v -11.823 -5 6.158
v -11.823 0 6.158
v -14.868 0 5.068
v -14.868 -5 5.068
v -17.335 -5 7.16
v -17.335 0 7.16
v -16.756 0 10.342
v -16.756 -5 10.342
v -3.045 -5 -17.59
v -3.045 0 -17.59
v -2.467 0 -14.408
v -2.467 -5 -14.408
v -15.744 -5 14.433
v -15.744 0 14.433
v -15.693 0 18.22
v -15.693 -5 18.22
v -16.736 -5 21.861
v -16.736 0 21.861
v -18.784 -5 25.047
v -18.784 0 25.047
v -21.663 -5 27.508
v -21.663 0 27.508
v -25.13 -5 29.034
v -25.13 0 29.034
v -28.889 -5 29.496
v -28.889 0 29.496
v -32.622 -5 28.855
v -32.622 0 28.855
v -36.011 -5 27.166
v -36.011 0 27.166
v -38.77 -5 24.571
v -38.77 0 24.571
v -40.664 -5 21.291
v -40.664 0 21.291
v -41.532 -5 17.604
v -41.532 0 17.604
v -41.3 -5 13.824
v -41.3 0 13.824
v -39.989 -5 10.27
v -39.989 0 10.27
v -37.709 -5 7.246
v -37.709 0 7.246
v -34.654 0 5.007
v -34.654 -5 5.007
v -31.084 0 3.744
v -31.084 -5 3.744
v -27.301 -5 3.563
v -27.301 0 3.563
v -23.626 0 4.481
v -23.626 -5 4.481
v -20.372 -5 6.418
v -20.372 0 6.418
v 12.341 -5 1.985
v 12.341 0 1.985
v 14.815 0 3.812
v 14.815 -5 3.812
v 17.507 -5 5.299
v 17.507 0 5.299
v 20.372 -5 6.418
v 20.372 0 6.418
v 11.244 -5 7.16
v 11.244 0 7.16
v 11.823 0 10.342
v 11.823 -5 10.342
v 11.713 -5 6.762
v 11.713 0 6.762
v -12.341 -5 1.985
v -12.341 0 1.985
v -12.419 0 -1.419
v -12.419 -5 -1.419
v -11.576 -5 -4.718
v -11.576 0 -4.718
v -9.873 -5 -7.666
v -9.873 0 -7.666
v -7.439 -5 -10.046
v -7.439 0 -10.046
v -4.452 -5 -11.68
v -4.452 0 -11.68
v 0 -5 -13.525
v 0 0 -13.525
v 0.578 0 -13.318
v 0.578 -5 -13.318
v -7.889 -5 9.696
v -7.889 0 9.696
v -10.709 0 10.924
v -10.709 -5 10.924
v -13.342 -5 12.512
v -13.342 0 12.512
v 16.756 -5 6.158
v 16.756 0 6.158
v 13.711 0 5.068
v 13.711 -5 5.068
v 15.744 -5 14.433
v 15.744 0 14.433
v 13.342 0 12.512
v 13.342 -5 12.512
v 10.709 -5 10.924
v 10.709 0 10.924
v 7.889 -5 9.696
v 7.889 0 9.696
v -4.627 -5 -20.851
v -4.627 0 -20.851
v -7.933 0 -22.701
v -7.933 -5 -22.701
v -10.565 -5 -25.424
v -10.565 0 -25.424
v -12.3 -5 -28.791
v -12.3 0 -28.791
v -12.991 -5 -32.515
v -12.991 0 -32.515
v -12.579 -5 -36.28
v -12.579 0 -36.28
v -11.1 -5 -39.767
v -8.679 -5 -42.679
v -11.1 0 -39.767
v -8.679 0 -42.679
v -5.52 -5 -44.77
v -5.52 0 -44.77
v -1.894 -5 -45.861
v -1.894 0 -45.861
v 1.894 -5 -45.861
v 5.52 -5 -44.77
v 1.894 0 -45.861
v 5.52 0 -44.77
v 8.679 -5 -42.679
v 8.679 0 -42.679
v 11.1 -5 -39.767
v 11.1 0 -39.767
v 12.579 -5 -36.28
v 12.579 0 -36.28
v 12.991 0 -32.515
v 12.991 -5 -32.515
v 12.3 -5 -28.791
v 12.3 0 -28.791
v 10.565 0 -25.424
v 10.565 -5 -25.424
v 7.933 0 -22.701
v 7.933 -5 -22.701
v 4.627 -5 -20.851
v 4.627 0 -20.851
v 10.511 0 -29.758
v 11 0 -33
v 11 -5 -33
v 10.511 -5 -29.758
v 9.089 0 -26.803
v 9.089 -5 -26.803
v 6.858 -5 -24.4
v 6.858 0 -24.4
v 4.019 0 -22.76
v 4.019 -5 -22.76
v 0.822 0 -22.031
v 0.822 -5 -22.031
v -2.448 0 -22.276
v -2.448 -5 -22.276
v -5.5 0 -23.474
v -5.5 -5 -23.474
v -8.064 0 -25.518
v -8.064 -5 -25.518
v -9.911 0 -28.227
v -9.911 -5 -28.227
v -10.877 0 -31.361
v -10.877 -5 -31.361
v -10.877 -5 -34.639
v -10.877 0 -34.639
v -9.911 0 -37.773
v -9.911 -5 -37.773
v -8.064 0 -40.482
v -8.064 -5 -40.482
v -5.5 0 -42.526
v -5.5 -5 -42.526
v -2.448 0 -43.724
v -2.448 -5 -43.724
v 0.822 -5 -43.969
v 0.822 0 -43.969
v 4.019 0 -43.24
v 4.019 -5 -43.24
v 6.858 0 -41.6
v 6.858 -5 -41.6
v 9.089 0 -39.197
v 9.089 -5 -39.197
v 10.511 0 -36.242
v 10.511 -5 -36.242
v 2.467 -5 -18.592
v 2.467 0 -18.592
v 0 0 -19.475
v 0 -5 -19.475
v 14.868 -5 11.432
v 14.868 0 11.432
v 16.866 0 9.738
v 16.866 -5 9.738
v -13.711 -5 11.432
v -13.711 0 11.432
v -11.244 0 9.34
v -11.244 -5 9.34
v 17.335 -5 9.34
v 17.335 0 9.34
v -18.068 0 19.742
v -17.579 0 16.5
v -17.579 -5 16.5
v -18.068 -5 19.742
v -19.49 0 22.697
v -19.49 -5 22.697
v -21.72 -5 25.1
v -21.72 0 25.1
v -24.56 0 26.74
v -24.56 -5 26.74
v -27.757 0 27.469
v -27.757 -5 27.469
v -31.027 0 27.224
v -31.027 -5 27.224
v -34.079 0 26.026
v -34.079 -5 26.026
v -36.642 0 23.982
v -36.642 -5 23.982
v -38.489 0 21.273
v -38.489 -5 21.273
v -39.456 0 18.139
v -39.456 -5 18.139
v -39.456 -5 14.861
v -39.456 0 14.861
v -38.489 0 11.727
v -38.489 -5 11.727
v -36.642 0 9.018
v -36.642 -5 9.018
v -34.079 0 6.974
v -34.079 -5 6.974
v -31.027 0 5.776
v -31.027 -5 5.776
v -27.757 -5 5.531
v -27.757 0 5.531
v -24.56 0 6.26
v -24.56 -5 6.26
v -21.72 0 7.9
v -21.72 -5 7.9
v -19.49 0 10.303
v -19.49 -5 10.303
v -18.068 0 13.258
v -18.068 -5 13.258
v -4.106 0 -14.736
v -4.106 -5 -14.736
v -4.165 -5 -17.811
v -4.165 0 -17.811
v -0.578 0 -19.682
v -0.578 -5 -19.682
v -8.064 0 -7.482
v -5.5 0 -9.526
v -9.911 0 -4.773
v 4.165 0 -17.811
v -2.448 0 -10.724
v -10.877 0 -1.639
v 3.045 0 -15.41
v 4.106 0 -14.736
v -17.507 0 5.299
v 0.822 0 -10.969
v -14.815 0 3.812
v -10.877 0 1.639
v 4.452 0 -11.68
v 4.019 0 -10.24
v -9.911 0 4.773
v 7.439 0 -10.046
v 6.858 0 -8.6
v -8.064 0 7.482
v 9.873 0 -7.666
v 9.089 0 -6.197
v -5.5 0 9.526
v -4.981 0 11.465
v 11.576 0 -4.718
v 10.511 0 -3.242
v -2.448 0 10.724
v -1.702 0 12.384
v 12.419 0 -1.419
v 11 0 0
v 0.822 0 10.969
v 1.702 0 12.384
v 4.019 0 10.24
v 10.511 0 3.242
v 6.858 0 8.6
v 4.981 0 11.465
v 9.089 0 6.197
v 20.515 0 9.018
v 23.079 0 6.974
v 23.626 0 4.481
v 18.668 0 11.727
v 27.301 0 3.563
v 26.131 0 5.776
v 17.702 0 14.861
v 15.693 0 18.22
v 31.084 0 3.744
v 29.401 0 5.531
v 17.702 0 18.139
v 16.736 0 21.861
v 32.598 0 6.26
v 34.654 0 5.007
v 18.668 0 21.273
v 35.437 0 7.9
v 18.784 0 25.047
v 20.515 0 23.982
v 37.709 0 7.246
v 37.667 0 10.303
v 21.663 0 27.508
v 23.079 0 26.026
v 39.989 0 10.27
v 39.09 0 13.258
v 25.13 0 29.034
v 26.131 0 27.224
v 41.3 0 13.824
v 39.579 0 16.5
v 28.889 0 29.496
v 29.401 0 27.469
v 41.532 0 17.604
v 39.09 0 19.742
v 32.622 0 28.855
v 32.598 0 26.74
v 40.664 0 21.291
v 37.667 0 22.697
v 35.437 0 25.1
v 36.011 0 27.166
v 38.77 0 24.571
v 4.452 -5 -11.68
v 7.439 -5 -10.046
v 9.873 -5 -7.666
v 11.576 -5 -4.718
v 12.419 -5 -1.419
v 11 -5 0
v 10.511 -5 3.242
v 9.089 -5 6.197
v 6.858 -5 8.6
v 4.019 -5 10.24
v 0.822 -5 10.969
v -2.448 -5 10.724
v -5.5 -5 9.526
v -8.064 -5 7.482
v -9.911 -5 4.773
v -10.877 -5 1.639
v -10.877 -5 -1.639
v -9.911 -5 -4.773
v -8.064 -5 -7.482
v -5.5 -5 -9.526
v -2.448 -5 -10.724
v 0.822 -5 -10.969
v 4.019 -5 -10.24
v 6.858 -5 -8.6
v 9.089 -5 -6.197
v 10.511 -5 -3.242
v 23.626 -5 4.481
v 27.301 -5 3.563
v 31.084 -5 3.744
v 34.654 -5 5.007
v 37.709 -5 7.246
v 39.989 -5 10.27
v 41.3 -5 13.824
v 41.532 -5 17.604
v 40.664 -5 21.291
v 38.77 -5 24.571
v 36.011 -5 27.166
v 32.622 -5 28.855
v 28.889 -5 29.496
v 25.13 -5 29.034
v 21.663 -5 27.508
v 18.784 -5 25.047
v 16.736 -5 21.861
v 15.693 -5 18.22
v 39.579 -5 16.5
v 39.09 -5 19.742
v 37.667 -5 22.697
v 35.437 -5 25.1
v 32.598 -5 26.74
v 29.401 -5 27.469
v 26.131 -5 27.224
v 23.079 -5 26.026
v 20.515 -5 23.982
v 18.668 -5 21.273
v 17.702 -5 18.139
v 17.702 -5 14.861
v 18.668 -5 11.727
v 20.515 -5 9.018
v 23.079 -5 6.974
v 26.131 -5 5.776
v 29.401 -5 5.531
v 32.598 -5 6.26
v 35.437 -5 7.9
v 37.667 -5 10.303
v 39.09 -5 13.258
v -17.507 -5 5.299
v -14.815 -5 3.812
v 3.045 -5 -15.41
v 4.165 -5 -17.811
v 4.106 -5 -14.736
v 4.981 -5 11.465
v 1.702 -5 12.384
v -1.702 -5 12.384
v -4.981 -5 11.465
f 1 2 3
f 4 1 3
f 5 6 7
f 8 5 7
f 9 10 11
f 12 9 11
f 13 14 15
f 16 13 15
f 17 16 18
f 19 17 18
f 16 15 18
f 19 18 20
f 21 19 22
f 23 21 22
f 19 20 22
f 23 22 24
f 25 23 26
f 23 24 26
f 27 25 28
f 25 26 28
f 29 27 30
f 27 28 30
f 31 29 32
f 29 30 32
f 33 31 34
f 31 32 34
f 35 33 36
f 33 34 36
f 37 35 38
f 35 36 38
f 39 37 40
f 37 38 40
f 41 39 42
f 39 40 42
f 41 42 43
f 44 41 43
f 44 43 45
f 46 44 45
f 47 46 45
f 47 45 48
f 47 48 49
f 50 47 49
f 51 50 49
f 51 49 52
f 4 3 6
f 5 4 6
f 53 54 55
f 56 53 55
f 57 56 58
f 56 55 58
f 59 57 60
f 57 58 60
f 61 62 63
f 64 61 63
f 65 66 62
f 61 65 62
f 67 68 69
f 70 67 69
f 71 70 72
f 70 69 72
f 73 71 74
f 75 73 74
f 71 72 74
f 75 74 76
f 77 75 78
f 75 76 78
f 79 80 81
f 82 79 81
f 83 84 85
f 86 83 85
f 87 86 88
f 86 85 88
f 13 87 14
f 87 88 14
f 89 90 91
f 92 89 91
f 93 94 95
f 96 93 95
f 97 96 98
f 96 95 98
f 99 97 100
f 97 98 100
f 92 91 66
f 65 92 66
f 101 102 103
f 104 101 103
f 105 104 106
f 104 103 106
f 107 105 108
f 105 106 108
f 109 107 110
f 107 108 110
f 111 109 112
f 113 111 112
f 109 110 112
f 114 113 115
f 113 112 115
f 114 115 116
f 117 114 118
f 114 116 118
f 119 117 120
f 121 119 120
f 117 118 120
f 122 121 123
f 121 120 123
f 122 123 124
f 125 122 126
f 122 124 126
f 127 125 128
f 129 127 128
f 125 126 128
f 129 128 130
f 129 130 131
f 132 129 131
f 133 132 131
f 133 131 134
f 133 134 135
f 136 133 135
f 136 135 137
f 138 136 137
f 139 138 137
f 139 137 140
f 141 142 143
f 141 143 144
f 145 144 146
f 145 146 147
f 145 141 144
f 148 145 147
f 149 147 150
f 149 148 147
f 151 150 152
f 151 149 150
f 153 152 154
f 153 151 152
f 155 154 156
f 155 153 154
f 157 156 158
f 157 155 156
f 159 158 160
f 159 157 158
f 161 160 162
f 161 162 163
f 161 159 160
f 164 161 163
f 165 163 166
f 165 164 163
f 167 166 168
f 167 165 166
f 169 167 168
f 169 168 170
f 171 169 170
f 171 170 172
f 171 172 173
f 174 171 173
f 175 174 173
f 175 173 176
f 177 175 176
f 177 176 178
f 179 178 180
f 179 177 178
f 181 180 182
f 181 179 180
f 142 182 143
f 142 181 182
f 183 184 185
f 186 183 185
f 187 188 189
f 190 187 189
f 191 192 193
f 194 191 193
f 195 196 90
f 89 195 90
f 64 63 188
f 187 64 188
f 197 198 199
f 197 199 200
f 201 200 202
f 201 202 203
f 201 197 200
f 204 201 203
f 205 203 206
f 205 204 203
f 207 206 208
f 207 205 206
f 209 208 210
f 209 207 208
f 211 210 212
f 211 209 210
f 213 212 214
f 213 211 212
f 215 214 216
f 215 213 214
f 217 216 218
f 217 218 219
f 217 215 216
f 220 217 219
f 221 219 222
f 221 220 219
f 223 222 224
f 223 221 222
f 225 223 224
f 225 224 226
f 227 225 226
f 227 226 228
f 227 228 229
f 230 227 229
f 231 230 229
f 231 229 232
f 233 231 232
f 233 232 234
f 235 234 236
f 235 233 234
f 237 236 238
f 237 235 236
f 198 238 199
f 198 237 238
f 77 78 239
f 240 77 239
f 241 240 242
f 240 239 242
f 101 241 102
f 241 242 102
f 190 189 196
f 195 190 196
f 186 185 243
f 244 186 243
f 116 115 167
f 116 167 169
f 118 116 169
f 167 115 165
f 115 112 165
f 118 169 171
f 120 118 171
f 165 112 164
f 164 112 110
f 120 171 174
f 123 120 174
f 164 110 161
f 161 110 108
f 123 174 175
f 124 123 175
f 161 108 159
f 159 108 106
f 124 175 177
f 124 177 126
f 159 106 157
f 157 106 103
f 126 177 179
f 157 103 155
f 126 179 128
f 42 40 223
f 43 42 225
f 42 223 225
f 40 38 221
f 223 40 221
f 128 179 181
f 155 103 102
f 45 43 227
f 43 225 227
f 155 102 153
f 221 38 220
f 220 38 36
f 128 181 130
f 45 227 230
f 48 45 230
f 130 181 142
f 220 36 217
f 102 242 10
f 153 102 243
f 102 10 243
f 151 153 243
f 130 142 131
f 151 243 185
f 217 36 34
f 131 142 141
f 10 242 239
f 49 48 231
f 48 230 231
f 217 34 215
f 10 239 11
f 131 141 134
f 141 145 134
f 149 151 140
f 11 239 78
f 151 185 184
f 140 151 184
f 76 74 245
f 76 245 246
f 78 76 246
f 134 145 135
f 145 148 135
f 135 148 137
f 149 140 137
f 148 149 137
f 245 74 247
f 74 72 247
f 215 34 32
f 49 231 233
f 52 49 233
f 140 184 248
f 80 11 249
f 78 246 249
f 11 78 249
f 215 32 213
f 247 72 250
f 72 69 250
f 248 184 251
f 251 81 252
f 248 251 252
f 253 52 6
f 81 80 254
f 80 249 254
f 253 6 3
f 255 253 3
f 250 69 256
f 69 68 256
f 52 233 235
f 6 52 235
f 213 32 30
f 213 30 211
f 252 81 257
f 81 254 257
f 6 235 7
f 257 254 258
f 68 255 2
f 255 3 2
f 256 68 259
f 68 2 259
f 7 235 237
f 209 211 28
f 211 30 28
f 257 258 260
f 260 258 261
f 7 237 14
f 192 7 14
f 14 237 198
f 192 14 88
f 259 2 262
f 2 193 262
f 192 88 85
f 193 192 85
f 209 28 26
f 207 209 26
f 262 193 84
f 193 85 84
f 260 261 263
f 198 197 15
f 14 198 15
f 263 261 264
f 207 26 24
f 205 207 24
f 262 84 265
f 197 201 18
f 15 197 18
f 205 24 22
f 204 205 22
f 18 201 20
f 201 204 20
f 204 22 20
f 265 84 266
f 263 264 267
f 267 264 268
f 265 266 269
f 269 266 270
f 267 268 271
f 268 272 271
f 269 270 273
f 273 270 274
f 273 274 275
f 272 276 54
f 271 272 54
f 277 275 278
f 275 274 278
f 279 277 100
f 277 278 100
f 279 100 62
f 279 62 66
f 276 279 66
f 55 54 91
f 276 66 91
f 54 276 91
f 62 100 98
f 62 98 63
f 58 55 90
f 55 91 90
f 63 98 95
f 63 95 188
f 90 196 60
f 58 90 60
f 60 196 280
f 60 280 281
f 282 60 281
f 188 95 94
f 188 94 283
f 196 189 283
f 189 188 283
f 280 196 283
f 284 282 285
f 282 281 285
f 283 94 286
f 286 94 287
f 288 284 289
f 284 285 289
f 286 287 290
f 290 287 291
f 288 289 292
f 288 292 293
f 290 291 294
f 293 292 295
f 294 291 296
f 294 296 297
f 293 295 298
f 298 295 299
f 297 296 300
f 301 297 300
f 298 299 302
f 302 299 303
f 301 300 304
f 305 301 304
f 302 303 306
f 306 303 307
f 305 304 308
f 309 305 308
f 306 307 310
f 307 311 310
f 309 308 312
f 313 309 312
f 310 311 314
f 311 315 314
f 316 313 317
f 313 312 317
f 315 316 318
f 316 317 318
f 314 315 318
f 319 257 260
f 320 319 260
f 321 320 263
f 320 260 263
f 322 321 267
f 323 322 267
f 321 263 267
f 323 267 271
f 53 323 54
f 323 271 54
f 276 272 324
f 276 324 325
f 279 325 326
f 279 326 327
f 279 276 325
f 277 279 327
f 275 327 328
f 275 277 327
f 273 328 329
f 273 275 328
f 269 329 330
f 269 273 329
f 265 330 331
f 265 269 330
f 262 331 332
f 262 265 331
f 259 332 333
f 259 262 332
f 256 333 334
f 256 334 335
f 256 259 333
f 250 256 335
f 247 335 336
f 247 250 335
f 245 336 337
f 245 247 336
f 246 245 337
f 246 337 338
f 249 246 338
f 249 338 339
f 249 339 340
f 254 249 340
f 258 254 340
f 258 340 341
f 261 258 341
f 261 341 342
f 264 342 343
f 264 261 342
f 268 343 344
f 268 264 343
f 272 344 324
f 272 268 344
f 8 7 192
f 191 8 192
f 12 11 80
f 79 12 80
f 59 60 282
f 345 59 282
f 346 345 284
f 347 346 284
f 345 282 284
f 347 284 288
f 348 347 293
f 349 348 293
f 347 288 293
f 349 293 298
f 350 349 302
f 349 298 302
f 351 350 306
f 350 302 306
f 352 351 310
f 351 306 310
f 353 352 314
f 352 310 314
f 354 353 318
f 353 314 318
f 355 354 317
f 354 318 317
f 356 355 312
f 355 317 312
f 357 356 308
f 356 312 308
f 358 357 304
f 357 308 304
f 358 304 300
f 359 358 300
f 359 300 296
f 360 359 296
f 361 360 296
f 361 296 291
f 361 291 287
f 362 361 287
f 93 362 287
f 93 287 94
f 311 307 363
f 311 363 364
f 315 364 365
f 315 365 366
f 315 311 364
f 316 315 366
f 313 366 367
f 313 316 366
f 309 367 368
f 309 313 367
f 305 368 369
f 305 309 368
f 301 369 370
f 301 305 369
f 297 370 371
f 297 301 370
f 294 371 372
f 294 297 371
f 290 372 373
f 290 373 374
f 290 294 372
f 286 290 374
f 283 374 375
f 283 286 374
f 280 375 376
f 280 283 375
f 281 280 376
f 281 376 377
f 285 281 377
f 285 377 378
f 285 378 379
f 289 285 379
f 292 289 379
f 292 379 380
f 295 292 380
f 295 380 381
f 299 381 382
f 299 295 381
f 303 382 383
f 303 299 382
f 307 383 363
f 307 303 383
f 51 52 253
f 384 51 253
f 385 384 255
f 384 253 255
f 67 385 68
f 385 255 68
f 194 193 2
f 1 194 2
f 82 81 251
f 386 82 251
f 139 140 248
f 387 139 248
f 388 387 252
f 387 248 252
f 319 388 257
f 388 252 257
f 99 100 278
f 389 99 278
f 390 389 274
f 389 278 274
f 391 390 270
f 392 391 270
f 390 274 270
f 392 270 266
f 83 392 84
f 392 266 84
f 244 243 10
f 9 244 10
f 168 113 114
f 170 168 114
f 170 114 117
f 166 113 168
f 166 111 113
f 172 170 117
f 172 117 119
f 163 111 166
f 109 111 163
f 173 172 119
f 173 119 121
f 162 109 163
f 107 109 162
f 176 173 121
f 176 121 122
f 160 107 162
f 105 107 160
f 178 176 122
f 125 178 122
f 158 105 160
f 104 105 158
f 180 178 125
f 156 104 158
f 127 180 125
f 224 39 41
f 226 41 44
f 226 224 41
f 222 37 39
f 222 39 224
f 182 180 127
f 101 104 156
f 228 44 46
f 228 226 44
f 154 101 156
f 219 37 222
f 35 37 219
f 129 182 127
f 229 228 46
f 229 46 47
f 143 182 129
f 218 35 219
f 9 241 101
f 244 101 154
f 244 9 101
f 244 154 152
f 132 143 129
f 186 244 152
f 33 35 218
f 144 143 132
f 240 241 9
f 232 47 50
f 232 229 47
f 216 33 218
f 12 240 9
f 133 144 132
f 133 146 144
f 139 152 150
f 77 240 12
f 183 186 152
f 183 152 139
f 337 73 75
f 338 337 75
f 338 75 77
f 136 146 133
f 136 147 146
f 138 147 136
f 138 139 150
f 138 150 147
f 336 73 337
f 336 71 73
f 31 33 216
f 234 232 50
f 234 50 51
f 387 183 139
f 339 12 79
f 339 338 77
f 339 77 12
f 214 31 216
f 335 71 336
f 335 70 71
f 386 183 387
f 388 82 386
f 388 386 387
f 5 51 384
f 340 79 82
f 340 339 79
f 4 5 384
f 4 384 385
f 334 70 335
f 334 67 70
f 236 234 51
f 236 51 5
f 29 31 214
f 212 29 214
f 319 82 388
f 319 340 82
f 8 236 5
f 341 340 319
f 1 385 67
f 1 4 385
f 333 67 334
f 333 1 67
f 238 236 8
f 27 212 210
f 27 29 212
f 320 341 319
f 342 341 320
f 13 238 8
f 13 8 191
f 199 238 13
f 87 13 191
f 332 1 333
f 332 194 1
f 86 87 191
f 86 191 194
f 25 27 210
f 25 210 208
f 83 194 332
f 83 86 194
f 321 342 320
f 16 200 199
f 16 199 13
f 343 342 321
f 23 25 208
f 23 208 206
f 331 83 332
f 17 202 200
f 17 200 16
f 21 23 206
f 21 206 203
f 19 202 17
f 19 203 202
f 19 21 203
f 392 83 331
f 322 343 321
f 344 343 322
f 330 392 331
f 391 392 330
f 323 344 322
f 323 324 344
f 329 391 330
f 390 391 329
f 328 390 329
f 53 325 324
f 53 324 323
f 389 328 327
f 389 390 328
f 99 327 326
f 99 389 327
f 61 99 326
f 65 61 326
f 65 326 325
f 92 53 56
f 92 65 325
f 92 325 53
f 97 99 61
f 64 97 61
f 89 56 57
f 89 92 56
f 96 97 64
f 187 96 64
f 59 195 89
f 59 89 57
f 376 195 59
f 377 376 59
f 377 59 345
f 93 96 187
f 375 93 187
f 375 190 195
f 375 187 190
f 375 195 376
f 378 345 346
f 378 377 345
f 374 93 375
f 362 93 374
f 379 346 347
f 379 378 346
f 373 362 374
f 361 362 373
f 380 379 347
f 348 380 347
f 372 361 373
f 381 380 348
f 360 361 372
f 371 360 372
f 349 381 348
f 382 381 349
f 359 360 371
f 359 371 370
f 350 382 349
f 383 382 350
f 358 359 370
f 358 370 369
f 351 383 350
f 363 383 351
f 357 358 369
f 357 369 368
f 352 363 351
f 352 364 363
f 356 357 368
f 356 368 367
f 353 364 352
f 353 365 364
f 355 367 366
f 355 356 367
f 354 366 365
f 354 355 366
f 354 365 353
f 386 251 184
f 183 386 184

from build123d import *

# Parameters (mm, degrees)
F0_R     = 11
F1_DEPTH = 5


with BuildPart() as f1:
    # F0 (on Front) → F1 (new body)
    with BuildSketch(Plane.XZ):
        with BuildLine():
            ThreePointArc((12.3414423693, 1.9846410874), (16.1365395854, 4.5999074354), (20.3716352974, 6.4182432847))
            ThreePointArc((20.3716352974, 6.4182432847), (39.8371685741, 23), (15.744179381, 14.4332320418))
            ThreePointArc((15.744179381, 14.4332320418), (12.0519064868, 11.6746994925), (7.8894707837, 9.6956820675))
            ThreePointArc((7.8894707837, 9.6956820675), (0, 12.5), (-7.8894707837, 9.6956820675))
            ThreePointArc((-7.8894707837, 9.6956820675), (-12.0519064868, 11.6746994925), (-15.744179381, 14.4332320418))
            ThreePointArc((-15.744179381, 14.4332320418), (-39.8371685741, 23), (-20.3716352974, 6.4182432847))
            ThreePointArc((-20.3716352974, 6.4182432847), (-16.1365395854, 4.5999074354), (-12.3414423693, 1.9846410874))
            ThreePointArc((-12.3414423693, 1.9846410874), (-10.8253175473, -6.25), (-4.4519715856, -11.6803231548))
            ThreePointArc((-4.4519715856, -11.6803231548), (-4.0846330986, -16.2746069278), (-4.6274559164, -20.8514753266))
            ThreePointArc((-4.6274559164, -20.8514753266), (0, -46), (4.6274559164, -20.8514753266))
            ThreePointArc((4.6274559164, -20.8514753266), (4.0846330986, -16.2746069278), (4.4519715856, -11.6803231548))
            ThreePointArc((4.4519715856, -11.6803231548), (10.8253175473, -6.25), (12.3414423693, 1.9846410874))
        make_face()
        with Locations((0, -33)):
            Circle(F0_R, mode=Mode.SUBTRACT)
        Polygon((0.5784799381, -13.3175262717), (3.0453430646, -15.4097414578), (2.4668631266, -18.5922151861), (0, -19.4753730239), (-0.5784799381, -19.6824737283), (-3.0453430646, -17.5902585422), (-2.4668631266, -14.4077848139), (0, -13.5246269761), align=None, mode=Mode.SUBTRACT)
        Polygon((-11.8225560359, 6.1577848139), (-14.8678991005, 5.0675262717), (-17.3347622271, 7.1597414578), (-16.756282289, 10.3422151861), (-13.7109392244, 11.4324737283), (-11.2440760978, 9.3402585422), align=None, mode=Mode.SUBTRACT)
        with Locations((-28.5788383249, 16.5)):
            Circle(F0_R, mode=Mode.SUBTRACT)
        Circle(F0_R, mode=Mode.SUBTRACT)
        Polygon((17.3347622271, 9.3402585422), (16.756282289, 6.1577848139), (13.7109392244, 5.0675262717), (11.712670538, 6.7623134881), (11.2440760978, 7.1597414578), (11.8225560359, 10.3422151861), (14.8678991005, 11.4324737283), (16.8661677868, 9.7376865119), align=None, mode=Mode.SUBTRACT)
        with Locations((28.5788383249, 16.5)):
            Circle(F0_R, mode=Mode.SUBTRACT)
    extrude(amount=F1_DEPTH)


solid = f1.part
